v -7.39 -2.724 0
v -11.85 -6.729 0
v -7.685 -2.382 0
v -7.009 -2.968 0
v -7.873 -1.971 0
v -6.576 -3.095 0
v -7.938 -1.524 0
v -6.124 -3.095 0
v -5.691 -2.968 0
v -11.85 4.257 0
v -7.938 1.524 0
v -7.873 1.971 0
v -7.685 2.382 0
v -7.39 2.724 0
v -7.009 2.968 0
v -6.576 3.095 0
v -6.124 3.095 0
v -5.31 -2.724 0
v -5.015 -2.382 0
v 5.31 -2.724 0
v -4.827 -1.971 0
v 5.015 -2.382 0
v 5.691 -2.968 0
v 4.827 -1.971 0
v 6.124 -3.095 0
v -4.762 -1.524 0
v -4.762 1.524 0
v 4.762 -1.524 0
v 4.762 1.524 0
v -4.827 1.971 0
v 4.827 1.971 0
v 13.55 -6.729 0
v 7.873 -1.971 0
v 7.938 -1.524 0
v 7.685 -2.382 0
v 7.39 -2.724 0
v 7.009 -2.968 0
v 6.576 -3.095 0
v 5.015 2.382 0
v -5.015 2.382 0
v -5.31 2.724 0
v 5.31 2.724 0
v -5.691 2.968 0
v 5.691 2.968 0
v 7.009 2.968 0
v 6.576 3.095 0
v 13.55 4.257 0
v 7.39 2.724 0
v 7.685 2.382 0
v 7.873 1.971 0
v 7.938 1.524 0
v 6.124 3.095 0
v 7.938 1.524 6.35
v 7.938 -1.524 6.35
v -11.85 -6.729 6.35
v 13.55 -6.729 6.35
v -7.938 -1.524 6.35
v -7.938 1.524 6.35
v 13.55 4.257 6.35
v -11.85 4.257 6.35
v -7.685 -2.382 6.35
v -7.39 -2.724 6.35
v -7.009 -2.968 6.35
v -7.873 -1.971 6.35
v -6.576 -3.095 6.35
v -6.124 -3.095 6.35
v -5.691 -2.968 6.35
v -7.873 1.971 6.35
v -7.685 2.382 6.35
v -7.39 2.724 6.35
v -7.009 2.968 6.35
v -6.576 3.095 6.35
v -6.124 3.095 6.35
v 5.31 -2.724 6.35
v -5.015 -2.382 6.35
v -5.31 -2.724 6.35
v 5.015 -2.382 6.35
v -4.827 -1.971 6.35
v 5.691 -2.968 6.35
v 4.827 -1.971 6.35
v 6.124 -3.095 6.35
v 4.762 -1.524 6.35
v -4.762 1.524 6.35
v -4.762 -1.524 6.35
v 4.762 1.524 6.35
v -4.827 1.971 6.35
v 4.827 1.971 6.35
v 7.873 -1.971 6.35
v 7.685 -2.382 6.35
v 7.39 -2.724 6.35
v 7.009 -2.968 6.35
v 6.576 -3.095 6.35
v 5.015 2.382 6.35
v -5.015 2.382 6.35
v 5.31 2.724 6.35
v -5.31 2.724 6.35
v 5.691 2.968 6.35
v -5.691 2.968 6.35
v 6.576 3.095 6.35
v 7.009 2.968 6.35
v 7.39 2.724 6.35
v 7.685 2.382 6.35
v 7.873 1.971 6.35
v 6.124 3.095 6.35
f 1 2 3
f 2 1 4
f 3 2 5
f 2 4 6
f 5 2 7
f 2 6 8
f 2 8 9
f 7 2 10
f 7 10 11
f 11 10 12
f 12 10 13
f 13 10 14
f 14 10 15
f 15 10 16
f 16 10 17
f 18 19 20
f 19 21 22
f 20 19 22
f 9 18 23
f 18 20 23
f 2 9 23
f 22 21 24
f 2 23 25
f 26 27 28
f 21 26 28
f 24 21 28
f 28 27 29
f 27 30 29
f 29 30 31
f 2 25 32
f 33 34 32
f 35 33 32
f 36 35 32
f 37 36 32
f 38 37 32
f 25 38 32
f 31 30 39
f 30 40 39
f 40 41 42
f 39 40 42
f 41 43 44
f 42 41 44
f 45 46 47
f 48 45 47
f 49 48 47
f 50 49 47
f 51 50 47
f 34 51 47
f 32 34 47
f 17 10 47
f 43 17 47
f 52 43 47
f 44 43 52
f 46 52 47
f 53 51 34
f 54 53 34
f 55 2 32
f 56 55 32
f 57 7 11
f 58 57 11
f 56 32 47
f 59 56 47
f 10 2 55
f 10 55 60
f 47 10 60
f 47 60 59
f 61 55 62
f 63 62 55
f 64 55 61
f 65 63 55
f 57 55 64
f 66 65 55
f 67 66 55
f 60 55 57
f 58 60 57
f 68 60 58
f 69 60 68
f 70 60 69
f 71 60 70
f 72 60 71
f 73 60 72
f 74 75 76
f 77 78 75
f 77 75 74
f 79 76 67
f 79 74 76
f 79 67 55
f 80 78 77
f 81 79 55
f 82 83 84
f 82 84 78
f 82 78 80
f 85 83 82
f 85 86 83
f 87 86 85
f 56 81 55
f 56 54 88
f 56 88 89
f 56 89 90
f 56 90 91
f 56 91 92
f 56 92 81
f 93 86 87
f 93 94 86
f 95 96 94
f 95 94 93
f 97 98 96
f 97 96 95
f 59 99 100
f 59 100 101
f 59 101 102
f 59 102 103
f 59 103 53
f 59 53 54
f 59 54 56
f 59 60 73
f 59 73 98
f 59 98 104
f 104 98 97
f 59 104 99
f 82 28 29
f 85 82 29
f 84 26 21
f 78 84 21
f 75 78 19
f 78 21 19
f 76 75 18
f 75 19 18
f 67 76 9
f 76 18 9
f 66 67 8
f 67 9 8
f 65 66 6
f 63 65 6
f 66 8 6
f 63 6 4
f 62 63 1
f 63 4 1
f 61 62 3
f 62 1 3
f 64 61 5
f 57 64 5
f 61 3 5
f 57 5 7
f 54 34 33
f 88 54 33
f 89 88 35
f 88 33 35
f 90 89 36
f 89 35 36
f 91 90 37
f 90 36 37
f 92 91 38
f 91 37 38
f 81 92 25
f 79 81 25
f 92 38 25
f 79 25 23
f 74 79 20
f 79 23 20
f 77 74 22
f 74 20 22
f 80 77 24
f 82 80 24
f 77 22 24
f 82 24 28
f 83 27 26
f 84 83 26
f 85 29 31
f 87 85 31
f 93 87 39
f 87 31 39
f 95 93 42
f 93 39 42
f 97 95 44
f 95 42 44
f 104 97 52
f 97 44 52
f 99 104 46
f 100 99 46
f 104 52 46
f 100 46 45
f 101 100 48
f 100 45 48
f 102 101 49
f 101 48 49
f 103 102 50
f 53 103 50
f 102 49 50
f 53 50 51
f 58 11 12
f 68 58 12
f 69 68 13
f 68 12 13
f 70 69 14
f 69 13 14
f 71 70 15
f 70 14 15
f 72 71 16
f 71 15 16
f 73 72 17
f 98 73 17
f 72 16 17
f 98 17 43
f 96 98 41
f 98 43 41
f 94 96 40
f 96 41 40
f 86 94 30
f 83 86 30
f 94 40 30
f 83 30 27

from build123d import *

# Parameters (mm, degrees)
F0_W     = 25.4
F0_H     = 10.9855
F1_DEPTH = 6.35


with BuildPart() as f1:
    # F0 (on Top) → F1 (new body)
    with BuildSketch(Plane.XY):
        with Locations((0.85008, -1.236201)):
            Rectangle(F0_W, F0_H)
        with BuildLine():
            Line((-4.7625, 1.524), (-4.7625, 0))
            Line((-4.7625, 0), (-4.7625, -1.524))
            ThreePointArc((-4.7625, -1.524), (-6.35, -3.1115), (-7.9375, -1.524))
            Line((-7.9375, -1.524), (-7.9375, 0))
            Line((-7.9375, 0), (-7.9375, 1.524))
            ThreePointArc((-7.9375, 1.524), (-6.35, 3.1115), (-4.7625, 1.524))
        make_face(mode=Mode.SUBTRACT)
        with BuildLine():
            Line((7.9375, 1.524), (7.9375, 0))
            Line((7.9375, 0), (7.9375, -1.524))
            ThreePointArc((7.9375, -1.524), (6.35, -3.1115), (4.7625, -1.524))
            Line((4.7625, -1.524), (4.7625, 0))
            Line((4.7625, 0), (4.7625, 1.524))
            ThreePointArc((4.7625, 1.524), (6.35, 3.1115), (7.9375, 1.524))
        make_face(mode=Mode.SUBTRACT)
    extrude(amount=F1_DEPTH)


solid = f1.part
